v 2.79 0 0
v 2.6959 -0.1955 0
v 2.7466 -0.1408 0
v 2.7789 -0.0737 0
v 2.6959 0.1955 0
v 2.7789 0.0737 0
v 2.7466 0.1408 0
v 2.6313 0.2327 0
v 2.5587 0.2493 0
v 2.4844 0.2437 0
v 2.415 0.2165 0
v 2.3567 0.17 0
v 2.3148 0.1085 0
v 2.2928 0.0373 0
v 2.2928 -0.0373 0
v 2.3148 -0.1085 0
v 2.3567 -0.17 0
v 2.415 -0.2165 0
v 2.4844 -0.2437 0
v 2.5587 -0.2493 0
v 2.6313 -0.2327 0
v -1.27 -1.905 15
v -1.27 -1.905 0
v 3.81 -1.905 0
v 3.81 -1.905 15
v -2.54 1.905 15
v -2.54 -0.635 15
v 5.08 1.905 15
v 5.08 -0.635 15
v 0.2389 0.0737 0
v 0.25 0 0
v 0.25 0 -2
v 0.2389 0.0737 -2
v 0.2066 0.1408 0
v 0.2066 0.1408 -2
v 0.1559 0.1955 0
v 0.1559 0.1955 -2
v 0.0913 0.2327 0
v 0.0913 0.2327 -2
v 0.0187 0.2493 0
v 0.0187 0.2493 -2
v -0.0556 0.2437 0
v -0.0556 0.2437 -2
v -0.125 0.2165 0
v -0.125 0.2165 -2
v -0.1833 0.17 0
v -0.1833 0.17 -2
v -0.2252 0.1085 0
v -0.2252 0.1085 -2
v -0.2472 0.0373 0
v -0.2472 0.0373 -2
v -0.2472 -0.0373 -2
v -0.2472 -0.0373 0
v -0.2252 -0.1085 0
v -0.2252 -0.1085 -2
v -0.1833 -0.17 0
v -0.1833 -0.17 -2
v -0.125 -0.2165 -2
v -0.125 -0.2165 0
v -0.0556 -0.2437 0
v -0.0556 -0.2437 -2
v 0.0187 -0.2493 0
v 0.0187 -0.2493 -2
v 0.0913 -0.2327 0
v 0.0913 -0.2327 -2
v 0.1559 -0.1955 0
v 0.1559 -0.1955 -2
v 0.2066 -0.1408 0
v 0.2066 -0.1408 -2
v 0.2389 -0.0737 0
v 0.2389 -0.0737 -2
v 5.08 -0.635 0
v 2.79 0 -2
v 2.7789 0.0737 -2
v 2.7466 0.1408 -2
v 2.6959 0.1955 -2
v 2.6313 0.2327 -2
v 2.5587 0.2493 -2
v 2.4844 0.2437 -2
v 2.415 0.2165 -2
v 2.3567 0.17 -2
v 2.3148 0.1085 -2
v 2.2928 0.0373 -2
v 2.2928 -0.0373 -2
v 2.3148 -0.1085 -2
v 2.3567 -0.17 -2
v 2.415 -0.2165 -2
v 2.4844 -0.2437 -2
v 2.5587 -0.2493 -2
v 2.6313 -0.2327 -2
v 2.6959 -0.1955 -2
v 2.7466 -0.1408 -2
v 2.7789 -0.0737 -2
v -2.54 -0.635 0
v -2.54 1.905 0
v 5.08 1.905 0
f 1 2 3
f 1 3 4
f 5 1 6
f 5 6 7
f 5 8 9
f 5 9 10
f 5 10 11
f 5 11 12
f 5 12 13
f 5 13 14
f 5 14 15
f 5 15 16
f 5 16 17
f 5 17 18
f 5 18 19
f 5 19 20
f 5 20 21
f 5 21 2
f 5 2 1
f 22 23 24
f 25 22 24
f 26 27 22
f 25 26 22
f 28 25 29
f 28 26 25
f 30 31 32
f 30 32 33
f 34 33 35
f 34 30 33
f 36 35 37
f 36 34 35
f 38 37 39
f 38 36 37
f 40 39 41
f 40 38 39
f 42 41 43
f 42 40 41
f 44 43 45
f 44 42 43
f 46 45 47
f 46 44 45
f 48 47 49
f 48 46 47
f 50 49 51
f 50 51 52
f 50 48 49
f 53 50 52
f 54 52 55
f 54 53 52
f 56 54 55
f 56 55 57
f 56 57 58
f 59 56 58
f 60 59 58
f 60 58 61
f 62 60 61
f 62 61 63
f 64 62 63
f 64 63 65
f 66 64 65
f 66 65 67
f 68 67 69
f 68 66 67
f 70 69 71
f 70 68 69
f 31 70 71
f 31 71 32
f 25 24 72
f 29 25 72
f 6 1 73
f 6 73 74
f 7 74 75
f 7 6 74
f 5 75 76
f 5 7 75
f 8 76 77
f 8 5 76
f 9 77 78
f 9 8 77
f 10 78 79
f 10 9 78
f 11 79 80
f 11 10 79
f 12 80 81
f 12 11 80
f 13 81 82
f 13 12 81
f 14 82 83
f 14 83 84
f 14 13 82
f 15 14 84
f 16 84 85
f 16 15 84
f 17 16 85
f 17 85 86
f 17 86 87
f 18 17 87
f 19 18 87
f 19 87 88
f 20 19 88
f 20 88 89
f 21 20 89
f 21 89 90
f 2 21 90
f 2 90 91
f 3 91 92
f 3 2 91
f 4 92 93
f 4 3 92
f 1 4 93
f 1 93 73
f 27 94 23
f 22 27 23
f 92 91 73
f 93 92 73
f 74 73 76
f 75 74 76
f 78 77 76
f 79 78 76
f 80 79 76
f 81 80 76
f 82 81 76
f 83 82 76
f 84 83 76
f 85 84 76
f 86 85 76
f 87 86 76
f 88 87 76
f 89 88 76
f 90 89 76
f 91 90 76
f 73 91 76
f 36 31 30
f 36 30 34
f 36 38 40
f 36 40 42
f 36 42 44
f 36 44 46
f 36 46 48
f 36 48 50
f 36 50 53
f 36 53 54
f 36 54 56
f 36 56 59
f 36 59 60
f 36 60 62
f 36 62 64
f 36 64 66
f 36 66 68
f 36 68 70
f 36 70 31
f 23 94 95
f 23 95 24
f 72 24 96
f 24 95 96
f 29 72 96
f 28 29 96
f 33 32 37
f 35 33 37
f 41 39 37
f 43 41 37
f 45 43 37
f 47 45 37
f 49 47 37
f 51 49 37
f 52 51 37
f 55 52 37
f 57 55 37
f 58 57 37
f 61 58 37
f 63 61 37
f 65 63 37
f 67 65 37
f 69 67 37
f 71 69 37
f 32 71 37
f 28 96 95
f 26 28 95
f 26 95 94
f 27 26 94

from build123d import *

# Parameters (mm, degrees)
COMPONENT_OUTLINE_DEPTH = 15
SKETCH2_R               = 0.25
EXTRUDE_1_DEPTH         = 2
SKETCH3_R               = 0.25
EXTRUDE_2_DEPTH         = 2


with BuildPart() as part:
    # Sketch1 → Component_Outline (new body)
    with BuildSketch(Plane.XY):
        Polygon((-2.54, 1.905), (-2.54, -0.635), (-1.27, -1.905), (3.81, -1.905), (5.08, -0.635), (5.08, 1.905), align=None)
    extrude(amount=COMPONENT_OUTLINE_DEPTH)


with BuildPart() as body_2:
    # Sketch2 → Extrude 1 (new body)
    with BuildSketch(Plane.XY):
        Circle(SKETCH2_R)
    extrude(amount=-EXTRUDE_1_DEPTH)


with BuildPart() as body_3:
    # Sketch3 → Extrude 2 (new body)
    with BuildSketch(Plane.XY):
        with Locations((2.54, 0)):
            Circle(SKETCH3_R)
    extrude(amount=-EXTRUDE_2_DEPTH)


solid = Compound([part.part, body_2.part, body_3.part])
